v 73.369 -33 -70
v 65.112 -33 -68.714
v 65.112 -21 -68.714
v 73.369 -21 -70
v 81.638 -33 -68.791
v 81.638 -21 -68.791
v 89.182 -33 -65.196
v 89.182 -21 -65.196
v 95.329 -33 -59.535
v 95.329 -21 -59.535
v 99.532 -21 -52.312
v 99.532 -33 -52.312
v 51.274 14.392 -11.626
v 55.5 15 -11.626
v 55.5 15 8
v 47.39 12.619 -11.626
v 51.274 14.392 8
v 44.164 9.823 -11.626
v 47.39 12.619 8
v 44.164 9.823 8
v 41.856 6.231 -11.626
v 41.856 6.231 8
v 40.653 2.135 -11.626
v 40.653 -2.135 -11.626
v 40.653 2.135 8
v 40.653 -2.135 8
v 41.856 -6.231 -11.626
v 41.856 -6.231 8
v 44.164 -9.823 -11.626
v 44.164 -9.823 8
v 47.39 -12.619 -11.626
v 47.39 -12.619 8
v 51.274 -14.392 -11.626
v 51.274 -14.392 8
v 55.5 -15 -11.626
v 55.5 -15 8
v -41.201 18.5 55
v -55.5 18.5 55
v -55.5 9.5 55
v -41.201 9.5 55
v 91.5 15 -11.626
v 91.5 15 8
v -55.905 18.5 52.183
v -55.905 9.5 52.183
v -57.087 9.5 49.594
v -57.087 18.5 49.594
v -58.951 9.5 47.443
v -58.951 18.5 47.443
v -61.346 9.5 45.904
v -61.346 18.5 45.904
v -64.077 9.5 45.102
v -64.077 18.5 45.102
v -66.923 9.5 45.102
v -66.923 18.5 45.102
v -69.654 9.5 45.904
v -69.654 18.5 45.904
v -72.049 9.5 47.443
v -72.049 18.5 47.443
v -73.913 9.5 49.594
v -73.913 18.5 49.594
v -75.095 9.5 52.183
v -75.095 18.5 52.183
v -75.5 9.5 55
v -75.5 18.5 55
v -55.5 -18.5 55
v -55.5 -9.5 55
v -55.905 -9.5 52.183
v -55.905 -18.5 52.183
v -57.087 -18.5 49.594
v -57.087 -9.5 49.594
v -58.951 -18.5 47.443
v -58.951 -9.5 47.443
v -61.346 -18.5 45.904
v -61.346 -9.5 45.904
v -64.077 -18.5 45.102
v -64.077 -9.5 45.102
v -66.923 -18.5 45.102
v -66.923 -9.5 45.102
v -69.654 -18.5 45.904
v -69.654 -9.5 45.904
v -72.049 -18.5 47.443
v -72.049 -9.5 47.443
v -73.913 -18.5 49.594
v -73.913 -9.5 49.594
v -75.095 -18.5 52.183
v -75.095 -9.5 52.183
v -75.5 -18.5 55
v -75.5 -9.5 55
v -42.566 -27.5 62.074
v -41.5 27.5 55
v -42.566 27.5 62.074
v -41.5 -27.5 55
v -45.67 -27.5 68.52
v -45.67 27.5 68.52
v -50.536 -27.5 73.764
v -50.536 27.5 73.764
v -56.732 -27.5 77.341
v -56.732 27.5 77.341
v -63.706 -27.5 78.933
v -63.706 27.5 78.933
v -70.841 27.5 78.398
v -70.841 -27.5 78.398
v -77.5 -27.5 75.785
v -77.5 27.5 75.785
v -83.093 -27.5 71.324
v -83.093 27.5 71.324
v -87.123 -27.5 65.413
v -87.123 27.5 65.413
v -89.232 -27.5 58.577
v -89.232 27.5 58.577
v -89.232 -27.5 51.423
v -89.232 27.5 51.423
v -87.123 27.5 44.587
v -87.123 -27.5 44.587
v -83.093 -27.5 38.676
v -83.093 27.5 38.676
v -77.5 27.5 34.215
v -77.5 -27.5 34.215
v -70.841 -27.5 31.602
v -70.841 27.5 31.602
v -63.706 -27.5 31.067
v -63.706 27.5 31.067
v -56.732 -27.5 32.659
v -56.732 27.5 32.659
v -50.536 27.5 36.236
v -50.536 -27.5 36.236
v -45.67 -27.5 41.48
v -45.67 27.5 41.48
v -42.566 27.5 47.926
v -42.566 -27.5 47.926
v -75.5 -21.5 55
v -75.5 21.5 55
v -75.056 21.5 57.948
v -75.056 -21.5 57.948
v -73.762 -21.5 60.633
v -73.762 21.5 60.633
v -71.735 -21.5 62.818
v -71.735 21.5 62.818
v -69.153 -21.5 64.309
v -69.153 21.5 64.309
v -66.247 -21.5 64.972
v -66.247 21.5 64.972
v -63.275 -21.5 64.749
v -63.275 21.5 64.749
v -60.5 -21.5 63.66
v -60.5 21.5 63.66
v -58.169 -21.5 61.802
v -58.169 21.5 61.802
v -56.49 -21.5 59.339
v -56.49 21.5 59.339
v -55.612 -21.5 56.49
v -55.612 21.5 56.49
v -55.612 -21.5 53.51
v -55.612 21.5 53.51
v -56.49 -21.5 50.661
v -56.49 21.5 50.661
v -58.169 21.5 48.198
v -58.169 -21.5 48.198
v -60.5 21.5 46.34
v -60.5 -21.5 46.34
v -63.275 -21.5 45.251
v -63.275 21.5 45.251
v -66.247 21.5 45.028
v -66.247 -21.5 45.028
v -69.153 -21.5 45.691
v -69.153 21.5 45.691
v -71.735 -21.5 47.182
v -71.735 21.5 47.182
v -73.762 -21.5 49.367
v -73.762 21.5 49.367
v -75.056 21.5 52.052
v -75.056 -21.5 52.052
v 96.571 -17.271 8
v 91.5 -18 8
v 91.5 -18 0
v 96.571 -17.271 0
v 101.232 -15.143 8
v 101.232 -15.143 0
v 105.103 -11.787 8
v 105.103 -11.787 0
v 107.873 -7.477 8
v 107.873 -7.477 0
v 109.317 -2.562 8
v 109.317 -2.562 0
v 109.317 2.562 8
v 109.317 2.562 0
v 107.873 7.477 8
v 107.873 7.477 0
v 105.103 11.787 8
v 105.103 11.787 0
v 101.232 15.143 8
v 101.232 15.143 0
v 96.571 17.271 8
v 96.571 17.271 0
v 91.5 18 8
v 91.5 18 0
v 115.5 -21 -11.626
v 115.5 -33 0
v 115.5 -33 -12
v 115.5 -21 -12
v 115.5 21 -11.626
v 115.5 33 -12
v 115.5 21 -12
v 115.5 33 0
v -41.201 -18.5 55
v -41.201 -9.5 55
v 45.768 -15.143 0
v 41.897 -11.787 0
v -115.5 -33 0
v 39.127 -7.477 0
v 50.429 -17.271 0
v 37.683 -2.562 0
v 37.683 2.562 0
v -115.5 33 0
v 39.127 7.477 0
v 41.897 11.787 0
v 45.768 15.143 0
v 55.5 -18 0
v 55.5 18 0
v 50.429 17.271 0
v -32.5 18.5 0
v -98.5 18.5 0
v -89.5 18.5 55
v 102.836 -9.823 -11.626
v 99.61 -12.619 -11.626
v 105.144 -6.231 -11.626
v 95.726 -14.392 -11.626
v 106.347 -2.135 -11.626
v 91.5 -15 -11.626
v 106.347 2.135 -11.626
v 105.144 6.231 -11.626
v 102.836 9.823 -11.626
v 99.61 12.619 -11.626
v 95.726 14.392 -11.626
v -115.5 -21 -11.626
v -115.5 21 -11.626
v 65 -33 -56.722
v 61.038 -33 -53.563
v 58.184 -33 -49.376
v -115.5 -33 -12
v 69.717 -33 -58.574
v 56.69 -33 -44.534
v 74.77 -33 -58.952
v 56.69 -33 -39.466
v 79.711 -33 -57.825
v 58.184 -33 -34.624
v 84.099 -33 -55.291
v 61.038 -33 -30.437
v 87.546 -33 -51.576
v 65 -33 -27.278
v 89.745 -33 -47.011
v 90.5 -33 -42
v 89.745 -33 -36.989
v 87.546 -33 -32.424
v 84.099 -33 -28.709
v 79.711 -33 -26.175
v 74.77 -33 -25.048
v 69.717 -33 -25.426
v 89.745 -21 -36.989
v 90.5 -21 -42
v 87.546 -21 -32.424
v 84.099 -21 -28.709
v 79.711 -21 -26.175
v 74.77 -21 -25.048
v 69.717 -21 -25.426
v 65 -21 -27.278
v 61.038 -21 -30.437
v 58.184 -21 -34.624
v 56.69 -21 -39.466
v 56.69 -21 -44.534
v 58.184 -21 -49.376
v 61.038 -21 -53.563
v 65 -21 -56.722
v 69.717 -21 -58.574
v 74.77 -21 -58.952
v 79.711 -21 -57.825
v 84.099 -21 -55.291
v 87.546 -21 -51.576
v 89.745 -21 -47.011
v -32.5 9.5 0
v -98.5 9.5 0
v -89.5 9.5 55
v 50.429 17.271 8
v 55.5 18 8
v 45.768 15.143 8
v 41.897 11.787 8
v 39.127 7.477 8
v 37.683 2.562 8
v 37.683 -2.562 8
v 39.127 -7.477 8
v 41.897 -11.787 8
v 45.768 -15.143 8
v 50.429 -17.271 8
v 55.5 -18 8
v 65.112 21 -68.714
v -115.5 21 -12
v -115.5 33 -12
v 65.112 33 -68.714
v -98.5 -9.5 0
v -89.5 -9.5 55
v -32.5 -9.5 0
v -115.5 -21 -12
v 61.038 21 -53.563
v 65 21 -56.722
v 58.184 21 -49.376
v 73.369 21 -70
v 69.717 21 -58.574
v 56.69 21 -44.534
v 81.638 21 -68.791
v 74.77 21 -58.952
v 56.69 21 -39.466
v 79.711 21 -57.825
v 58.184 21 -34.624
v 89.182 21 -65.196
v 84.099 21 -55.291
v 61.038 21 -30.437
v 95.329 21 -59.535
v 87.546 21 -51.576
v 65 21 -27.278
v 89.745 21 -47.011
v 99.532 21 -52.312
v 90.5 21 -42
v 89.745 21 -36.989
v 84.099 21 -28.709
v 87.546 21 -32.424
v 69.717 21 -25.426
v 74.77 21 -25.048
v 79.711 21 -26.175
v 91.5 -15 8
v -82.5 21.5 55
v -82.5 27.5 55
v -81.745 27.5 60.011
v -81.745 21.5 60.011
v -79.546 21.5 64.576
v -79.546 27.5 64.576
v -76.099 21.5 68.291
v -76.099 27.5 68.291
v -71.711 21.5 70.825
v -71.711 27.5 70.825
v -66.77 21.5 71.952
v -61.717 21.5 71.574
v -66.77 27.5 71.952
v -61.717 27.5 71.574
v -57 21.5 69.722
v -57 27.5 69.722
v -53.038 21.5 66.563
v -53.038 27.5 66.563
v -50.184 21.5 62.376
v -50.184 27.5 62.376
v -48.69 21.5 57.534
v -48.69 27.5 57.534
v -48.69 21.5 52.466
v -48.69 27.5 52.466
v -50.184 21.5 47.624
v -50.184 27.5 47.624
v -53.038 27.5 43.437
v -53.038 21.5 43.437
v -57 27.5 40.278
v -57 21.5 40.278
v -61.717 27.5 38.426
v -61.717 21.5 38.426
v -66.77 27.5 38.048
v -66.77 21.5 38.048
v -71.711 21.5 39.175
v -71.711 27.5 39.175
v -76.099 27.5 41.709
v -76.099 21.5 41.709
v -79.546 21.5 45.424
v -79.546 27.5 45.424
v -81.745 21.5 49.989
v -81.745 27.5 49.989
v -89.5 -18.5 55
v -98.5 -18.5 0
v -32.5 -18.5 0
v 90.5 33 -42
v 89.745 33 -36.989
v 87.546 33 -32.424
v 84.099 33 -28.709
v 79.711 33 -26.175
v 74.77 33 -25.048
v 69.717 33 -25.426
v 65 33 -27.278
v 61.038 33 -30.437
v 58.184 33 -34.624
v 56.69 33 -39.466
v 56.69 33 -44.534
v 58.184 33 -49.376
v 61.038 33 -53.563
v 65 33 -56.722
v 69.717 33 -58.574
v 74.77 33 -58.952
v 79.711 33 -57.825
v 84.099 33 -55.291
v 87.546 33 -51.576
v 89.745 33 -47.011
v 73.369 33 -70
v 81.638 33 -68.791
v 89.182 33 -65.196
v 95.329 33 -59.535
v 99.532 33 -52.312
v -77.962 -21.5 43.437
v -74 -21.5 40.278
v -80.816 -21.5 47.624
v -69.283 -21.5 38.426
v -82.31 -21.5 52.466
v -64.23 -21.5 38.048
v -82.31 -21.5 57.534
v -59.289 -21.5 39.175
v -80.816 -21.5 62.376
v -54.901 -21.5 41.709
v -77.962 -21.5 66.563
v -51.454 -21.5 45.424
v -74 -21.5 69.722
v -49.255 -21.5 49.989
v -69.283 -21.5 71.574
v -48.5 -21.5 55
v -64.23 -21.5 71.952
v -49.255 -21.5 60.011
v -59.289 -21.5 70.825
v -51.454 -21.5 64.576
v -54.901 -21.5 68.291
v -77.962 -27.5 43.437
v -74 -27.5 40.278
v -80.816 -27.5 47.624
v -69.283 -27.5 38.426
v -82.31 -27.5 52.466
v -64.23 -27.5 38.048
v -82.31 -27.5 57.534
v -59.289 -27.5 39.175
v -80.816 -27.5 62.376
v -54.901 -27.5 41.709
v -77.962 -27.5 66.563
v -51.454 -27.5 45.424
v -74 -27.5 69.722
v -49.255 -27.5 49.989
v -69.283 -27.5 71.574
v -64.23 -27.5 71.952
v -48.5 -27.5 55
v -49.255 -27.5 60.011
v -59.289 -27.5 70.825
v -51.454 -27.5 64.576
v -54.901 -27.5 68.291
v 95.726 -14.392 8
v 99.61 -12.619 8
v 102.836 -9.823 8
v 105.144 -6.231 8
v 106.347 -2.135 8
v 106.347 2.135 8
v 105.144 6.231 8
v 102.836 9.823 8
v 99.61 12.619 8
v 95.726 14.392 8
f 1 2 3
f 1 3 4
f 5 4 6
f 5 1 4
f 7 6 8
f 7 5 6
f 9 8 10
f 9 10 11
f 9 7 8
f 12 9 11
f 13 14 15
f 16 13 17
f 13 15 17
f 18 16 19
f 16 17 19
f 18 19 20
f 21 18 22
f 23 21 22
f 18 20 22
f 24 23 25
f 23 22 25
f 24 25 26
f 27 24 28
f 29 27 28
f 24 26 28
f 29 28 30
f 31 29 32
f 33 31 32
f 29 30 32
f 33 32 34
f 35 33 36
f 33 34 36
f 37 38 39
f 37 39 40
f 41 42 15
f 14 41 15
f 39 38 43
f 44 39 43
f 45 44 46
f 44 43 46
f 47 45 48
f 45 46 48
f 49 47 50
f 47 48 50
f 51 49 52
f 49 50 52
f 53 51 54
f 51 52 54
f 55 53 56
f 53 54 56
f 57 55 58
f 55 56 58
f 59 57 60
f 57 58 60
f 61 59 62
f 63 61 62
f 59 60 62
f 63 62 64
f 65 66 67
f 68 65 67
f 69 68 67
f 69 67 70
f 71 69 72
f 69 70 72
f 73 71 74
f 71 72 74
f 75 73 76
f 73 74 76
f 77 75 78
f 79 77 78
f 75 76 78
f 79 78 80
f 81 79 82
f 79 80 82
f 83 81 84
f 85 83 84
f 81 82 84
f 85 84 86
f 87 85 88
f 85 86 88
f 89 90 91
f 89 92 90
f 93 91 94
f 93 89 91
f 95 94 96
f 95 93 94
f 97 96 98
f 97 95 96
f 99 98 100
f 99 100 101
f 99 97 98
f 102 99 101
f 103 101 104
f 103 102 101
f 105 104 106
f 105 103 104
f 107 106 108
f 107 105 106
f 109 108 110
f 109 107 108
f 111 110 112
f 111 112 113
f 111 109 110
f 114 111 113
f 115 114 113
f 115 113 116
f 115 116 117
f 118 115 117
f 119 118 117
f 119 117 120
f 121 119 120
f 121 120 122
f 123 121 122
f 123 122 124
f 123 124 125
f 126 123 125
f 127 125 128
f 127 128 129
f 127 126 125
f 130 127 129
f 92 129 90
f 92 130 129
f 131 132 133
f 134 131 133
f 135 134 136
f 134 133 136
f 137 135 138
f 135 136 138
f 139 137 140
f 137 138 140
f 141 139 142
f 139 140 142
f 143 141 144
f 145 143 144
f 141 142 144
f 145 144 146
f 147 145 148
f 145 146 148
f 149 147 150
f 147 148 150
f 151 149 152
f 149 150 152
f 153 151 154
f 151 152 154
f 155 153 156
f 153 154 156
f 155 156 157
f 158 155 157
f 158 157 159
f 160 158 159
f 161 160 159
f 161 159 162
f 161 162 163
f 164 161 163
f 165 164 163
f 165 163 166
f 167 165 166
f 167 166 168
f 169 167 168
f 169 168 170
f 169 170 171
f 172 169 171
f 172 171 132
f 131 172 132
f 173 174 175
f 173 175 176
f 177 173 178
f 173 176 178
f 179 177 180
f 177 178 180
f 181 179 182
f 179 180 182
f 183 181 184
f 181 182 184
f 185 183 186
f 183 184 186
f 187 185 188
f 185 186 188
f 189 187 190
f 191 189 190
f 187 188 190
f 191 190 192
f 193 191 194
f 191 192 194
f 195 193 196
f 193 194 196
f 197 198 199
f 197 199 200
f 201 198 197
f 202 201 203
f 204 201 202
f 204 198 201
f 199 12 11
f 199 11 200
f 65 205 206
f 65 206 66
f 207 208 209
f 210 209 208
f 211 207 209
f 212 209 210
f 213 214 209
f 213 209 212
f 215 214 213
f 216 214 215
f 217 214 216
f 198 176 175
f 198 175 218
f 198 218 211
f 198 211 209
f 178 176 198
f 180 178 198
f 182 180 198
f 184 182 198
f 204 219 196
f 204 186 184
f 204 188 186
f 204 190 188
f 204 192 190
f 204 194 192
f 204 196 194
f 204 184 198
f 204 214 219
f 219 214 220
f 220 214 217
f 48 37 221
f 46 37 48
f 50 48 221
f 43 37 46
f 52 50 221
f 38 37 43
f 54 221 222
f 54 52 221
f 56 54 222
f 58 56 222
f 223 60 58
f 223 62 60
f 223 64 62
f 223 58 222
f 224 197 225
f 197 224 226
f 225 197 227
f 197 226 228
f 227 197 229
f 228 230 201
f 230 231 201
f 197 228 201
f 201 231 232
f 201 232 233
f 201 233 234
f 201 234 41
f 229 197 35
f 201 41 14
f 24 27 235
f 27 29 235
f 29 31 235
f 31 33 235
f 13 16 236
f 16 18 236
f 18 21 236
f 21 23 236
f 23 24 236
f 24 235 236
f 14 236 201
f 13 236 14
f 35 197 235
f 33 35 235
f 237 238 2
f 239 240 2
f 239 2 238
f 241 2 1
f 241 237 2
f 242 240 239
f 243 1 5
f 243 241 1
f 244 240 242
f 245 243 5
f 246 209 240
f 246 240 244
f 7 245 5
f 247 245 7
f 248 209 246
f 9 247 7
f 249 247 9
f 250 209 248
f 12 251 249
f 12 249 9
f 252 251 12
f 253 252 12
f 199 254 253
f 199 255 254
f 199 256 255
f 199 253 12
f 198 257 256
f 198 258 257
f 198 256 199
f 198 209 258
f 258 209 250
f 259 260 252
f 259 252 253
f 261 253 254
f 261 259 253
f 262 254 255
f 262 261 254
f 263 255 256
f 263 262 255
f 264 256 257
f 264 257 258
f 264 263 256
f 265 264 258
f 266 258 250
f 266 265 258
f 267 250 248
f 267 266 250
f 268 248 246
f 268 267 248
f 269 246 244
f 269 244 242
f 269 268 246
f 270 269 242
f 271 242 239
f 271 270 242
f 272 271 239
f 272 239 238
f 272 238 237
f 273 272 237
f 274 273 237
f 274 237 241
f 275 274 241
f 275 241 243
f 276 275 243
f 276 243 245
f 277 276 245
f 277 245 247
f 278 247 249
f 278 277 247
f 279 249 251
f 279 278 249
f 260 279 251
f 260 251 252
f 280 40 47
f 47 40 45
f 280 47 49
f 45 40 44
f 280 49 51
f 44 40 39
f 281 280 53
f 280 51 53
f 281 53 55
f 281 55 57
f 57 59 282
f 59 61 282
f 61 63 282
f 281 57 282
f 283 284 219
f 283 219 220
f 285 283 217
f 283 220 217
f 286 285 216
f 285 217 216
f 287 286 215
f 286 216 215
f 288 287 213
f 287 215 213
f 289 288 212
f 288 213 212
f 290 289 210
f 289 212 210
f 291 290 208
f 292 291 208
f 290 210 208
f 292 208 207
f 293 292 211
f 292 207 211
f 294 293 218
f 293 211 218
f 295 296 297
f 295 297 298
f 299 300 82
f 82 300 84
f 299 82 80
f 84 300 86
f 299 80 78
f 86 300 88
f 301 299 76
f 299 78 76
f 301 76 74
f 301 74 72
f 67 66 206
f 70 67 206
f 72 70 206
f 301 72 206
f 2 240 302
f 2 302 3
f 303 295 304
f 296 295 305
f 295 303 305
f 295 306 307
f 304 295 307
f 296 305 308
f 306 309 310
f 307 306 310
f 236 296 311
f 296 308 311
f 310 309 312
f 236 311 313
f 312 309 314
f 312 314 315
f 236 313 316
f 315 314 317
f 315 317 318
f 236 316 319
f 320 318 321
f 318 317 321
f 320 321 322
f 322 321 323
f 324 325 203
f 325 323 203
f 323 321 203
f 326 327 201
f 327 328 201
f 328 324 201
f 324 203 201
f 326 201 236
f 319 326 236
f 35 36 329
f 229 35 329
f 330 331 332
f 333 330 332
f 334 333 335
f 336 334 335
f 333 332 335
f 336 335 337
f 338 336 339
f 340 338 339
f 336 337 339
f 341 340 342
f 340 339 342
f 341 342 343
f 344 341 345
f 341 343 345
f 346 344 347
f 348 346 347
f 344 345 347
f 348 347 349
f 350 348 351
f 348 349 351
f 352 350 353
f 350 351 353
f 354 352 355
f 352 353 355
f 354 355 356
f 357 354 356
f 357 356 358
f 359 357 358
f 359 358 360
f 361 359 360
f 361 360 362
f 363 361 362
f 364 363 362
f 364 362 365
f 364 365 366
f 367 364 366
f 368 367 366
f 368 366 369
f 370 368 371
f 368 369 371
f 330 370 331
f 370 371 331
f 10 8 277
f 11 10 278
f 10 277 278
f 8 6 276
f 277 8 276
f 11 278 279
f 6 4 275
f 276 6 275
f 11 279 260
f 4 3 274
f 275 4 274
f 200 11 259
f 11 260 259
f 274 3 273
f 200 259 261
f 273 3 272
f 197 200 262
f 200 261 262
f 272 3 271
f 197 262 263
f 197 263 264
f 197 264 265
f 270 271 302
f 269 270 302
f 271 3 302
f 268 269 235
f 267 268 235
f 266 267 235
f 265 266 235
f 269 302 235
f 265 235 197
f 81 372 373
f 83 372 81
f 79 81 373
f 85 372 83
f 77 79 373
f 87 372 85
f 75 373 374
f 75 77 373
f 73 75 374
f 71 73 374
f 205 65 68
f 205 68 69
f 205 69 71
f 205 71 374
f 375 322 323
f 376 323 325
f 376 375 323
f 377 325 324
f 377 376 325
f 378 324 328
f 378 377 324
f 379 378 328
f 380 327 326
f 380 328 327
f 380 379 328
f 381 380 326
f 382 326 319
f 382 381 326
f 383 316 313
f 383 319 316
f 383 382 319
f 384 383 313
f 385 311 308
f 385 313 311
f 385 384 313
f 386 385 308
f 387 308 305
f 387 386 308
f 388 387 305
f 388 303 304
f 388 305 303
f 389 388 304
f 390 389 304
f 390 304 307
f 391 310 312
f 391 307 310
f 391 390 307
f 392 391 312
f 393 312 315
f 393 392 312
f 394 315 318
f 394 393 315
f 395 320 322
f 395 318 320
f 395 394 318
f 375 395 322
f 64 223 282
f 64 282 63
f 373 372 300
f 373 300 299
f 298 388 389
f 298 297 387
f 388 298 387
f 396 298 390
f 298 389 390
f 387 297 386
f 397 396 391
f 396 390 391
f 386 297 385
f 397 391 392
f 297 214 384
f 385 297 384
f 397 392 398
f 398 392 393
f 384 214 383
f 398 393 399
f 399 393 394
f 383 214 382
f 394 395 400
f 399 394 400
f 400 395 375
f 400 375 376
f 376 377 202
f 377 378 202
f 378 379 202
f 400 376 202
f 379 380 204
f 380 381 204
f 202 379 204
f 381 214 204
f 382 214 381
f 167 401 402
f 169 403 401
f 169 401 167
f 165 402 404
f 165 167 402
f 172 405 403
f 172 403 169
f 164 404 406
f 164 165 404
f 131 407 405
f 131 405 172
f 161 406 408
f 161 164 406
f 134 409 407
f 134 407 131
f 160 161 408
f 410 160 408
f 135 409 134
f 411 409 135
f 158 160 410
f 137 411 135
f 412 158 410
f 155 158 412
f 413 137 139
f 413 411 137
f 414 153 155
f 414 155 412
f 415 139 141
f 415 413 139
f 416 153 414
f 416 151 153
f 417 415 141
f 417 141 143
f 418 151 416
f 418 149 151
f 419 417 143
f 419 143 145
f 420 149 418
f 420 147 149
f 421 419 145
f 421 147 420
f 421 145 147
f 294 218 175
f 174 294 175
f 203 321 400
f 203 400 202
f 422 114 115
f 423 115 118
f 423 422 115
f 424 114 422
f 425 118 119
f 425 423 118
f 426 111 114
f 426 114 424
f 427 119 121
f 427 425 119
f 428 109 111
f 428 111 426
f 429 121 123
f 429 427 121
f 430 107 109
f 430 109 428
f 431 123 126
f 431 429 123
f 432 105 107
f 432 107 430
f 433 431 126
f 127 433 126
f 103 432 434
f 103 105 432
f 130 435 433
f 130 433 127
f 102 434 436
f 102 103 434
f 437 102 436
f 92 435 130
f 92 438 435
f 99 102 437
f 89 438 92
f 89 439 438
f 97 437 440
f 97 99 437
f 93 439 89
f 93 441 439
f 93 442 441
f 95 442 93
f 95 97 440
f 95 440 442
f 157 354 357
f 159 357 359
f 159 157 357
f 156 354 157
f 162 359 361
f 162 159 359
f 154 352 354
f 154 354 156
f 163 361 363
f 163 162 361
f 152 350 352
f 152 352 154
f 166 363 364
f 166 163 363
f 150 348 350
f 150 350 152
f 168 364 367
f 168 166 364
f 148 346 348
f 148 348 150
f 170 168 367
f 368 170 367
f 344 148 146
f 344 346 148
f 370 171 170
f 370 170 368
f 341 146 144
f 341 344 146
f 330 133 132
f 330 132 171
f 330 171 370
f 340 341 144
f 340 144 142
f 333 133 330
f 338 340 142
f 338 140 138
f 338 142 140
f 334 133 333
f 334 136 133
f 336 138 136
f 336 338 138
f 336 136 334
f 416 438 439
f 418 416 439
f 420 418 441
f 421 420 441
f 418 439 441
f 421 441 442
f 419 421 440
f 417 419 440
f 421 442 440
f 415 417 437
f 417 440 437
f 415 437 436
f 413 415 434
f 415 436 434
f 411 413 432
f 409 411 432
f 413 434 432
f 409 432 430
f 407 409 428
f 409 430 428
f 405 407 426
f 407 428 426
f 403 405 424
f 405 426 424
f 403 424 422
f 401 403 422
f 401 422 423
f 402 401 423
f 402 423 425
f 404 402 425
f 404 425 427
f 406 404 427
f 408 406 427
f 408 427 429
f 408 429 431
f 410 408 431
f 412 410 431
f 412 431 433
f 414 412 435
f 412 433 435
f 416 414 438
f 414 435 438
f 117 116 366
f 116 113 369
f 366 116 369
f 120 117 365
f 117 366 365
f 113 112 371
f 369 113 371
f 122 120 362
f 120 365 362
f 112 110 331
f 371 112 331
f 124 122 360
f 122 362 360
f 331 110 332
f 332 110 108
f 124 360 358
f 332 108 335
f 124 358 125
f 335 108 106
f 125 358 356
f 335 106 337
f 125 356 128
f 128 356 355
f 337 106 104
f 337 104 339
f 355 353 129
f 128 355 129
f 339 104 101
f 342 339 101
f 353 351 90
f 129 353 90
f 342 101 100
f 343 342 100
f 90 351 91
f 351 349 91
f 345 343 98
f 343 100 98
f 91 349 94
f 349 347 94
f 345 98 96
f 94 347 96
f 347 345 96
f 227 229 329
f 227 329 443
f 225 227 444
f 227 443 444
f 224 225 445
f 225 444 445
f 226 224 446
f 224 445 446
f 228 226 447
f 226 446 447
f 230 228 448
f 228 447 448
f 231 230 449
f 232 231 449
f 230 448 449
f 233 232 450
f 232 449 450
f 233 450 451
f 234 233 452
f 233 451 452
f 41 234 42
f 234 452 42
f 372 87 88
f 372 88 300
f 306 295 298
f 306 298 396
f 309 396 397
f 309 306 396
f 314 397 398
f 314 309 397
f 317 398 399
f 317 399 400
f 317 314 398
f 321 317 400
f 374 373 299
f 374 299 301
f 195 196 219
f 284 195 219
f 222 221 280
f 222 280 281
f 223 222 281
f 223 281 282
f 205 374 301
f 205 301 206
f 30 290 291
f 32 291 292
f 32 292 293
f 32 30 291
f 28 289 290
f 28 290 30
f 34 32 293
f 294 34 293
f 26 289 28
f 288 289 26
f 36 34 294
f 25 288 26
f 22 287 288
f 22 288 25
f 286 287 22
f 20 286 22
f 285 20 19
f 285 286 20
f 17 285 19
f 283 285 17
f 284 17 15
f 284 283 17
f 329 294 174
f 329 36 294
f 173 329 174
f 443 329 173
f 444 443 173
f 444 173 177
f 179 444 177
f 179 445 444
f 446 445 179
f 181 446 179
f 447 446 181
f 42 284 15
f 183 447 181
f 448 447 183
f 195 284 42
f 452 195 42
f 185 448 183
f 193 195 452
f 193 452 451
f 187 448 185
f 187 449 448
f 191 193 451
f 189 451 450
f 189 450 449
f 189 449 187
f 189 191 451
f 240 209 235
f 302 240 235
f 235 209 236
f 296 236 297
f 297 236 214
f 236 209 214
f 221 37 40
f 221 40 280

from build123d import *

# Parameters (mm, degrees)
F0_W           = 231
F0_H           = 66
F1_DEPTH       = 12
F3_DEPTH       = 8
F4_DEPTH       = 12.001
F5_R           = 24
F6_DEPTH       = 27.5
F9_DEPTH       = 9
F12_DEPTH      = 9
F13_R          = 10
F14_DEPTH      = 60.501
F15_R          = 17
F15_R_2        = 10
F16_DEPTH      = 6
F17_R          = 17
F17_R_2        = 10
F18_DEPTH      = 6
F19_R          = 17
F20_DEPTH      = 33
F21_W          = 42
F21_H          = 65.047390759
F22_DEPTH      = 115.501
F22_DEPTH_BACK = 115.501


with BuildPart() as f1:
    # F0 (on Top) → F1 (new body)
    with BuildSketch(Plane.XY):
        Rectangle(F0_W, F0_H)
    extrude(amount=-F1_DEPTH)

    # F2 (on face) → F3 (join)
    with BuildSketch(Plane.XY):
        with BuildLine():
            Line((91.5, 18), (55.5, 18))
            ThreePointArc((55.5, 18), (37.5, 0), (55.5, -18))
            Line((55.5, -18), (91.5, -18))
            ThreePointArc((91.5, -18), (109.5, 0), (91.5, 18))
        make_face()
        with BuildLine():
            ThreePointArc((55.5, -15), (40.5, 0), (55.5, 15))
            Line((55.5, 15), (91.5, 15))
            ThreePointArc((91.5, 15), (106.5, 0), (91.5, -15))
            Line((91.5, -15), (55.5, -15))
        make_face(mode=Mode.SUBTRACT)
    extrude(amount=F3_DEPTH)

    # F2 (on face) → F4 (cut, through all)
    with BuildSketch(Plane.XY):
        with BuildLine():
            Line((91.5, 15), (55.5, 15))
            ThreePointArc((55.5, 15), (40.5, 0), (55.5, -15))
            Line((55.5, -15), (91.5, -15))
            ThreePointArc((91.5, -15), (106.5, 0), (91.5, 15))
        make_face()
    extrude(amount=-F4_DEPTH, mode=Mode.SUBTRACT)

    # F19 (on Front) → F20 (join, symmetric)
    with BuildSketch(Plane.XZ):
        with BuildLine():
            Line((-115.5, -12), (65.1115461391, -68.7139259905))
            ThreePointArc((65.1115461391, -68.7139259905), (85.5450639021, -67.2767963871), (99.5321066415, -52.3116159648))
            Line((99.5321066415, -52.3116159648), (115.5, -12))
            Line((115.5, -12), (-115.5, -12))
        make_face()
        with Locations((73.5, -42)):
            Circle(F19_R, mode=Mode.SUBTRACT)
    extrude(amount=F20_DEPTH, both=True)

    # F21 (on Right) → F22 (cut, two sides)
    with BuildSketch(Plane.YZ) as f22_sk:
        with Locations((0, -44.1492460668)):
            Rectangle(F21_W, F21_H)
    extrude(amount=F22_DEPTH, mode=Mode.SUBTRACT)
    extrude(f22_sk.sketch, amount=-F22_DEPTH_BACK, mode=Mode.SUBTRACT)


with BuildPart() as f6:
    # F5 (on Front) → F6 (new body, symmetric)
    with BuildSketch(Plane.XZ):
        with Locations((-65.5, 55)):
            Circle(F5_R)
    extrude(amount=F6_DEPTH, both=True)


with BuildPart() as f9:
    # F8 (on offset) → F9 (new body)
    with BuildSketch(Plane.XZ.offset(18.5)):
        Polygon((-89.5, 55), (-98.5, 0), (-32.5, 0), (-41.2014952838, 55), align=None)
    extrude(amount=-F9_DEPTH)


with BuildPart() as f12:
    # F11 (on offset) → F12 (new body)
    with BuildSketch(Plane(origin=(0, 18.5, 0), x_dir=(-1, 0, 0), z_dir=(0, 1, 0))):
        Polygon((41.2014952838, 55), (32.5, 0), (98.5, 0), (89.5, 55), align=None)
    extrude(amount=-F12_DEPTH)


with BuildPart() as f14_tool:
    # F13 (on face) → F14 (new body, through all)
    with BuildSketch(Plane(origin=(0, 27.5, 0), x_dir=(-1, 0, 0), z_dir=(0, 1, 0))):
        with Locations((65.5, 55)):
            Circle(F13_R)
    extrude(amount=-F14_DEPTH)


with BuildPart() as f6_1:
    add(f6.part)

    # F14: cut by f14_tool
    add(f14_tool.part, mode=Mode.SUBTRACT)

    # F15 (on face) → F16 (cut)
    with BuildSketch(Plane(origin=(0, 27.5, 0), x_dir=(-1, 0, 0), z_dir=(0, 1, 0))):
        with Locations((65.5, 55)):
            Circle(F15_R)
        with Locations((65.5, 55)):
            Circle(F15_R_2, mode=Mode.SUBTRACT)
    extrude(amount=-F16_DEPTH, mode=Mode.SUBTRACT)

    # F17 (on face) → F18 (cut)
    with BuildSketch(Plane.XZ.offset(27.5)):
        with Locations((-65.5, 55)):
            Circle(F17_R)
        with Locations((-65.5, 55)):
            Circle(F17_R_2, mode=Mode.SUBTRACT)
    extrude(amount=-F18_DEPTH, mode=Mode.SUBTRACT)


with BuildPart() as f9_1:
    add(f9.part)

    # F14: cut by f14_tool
    add(f14_tool.part, mode=Mode.SUBTRACT)


with BuildPart() as f12_1:
    add(f12.part)

    # F14: cut by f14_tool
    add(f14_tool.part, mode=Mode.SUBTRACT)


solid = Compound([f1.part, f6_1.part, f9_1.part, f12_1.part])
